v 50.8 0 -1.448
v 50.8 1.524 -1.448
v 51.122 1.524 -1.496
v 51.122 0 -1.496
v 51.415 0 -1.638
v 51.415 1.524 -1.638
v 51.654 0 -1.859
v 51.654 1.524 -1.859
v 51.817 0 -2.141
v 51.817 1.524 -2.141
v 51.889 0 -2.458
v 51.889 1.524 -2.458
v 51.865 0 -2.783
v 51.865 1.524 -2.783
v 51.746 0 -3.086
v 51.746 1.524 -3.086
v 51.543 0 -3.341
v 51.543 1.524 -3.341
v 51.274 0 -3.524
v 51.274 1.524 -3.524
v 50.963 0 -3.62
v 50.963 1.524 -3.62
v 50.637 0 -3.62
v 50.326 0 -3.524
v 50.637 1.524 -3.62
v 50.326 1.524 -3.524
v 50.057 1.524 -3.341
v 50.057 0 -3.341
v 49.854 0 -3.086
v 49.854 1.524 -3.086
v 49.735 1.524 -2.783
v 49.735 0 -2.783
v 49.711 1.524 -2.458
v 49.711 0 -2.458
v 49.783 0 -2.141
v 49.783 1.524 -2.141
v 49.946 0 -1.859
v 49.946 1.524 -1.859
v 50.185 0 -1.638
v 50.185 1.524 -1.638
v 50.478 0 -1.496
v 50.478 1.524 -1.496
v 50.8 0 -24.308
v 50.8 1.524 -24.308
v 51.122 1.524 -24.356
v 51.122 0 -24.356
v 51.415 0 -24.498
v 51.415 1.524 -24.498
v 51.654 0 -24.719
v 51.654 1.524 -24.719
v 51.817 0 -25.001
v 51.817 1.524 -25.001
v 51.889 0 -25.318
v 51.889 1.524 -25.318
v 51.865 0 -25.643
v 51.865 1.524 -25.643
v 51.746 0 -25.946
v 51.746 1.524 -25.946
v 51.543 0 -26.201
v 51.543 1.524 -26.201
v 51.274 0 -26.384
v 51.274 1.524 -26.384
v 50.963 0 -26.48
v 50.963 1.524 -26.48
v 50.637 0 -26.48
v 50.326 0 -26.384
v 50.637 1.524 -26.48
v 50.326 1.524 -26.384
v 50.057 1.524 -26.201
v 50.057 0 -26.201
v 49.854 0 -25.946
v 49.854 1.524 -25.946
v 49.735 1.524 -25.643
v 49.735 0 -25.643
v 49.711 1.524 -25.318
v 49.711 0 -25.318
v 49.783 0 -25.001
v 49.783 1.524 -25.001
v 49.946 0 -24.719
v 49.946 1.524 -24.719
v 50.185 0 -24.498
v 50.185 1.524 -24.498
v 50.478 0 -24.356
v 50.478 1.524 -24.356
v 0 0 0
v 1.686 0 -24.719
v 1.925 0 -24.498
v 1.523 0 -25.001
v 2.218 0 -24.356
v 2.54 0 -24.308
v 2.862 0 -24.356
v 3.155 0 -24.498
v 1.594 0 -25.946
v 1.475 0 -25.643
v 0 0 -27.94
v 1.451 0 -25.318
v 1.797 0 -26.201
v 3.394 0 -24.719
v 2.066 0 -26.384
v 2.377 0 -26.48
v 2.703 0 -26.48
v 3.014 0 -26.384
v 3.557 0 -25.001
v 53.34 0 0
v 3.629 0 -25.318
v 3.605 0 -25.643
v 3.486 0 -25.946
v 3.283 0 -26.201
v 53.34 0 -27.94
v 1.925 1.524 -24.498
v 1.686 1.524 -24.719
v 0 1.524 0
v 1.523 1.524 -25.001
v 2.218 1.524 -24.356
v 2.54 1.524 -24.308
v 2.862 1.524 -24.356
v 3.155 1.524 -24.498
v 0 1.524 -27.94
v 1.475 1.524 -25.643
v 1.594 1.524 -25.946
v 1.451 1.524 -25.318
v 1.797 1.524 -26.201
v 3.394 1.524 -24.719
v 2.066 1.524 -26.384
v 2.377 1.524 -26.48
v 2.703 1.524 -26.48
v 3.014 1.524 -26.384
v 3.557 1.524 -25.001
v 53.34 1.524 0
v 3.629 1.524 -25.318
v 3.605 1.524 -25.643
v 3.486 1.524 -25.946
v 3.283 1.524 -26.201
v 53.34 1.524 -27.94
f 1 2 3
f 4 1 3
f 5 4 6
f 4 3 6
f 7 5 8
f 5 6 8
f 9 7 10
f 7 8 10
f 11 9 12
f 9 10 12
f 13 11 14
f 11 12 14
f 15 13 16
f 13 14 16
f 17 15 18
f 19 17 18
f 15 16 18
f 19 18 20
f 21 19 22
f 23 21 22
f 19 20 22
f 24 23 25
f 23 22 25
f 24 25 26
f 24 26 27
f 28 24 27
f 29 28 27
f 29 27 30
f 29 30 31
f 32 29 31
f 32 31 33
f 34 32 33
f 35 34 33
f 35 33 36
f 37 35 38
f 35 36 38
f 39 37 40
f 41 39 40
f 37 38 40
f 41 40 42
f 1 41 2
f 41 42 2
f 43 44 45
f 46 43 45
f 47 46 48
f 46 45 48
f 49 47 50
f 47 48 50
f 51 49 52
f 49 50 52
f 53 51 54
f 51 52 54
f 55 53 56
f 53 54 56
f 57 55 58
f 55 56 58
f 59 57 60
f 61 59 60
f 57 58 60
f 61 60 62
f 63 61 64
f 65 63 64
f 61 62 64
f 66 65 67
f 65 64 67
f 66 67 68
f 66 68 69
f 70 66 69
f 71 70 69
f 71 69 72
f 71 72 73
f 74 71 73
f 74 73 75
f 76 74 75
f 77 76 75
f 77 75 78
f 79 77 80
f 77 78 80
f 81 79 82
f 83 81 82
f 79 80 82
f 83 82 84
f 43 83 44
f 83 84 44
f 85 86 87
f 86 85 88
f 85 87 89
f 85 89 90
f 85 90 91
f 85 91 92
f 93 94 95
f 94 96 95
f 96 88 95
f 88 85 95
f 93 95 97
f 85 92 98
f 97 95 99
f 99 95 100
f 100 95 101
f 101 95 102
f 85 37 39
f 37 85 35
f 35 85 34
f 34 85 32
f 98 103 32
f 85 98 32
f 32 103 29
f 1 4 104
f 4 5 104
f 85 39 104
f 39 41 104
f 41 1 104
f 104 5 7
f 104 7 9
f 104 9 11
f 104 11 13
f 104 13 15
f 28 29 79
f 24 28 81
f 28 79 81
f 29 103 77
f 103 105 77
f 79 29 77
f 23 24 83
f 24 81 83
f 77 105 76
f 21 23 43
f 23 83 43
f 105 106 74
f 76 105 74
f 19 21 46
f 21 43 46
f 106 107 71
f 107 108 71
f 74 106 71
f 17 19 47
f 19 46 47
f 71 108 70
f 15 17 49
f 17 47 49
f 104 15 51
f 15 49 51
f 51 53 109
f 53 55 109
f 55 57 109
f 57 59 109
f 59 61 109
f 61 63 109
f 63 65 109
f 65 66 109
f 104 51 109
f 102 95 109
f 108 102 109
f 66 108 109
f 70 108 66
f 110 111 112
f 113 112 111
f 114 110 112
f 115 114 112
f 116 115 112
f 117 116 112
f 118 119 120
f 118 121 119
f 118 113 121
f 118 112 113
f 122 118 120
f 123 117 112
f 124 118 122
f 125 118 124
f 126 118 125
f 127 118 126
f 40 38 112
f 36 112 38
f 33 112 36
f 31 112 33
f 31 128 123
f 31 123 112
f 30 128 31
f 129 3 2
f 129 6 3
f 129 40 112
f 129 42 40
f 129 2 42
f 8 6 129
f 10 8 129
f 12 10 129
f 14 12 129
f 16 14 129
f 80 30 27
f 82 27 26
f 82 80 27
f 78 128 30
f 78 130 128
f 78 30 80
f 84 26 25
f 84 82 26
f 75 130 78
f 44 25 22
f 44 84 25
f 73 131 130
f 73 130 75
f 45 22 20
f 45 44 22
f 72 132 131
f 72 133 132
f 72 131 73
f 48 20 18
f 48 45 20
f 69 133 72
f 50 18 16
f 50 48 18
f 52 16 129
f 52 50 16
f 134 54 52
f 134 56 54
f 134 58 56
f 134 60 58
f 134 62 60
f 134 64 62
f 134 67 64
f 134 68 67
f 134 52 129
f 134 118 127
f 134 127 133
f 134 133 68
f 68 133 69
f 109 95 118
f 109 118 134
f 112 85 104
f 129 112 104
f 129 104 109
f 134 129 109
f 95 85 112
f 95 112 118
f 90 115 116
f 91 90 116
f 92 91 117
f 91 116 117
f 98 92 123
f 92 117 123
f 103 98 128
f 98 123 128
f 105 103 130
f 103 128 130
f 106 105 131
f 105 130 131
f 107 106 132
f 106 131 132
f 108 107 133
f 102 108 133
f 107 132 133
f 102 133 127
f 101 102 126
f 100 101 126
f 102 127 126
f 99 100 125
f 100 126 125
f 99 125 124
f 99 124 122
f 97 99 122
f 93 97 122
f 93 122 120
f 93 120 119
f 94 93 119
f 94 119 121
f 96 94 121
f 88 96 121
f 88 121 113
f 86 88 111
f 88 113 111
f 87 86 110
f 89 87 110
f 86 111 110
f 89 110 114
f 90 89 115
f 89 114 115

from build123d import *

# Parameters (mm, degrees)
SKETCH1_W           = 53.34
SKETCH1_H           = 27.94
BOSS_EXTRUDE1_DEPTH = 1.524
SKETCH2_R           = 1.0922
CUT_EXTRUDE1_DEPTH  = 1.524


with BuildPart() as part:
    # Sketch1 → Boss-Extrude1 (new body)
    with BuildSketch(Plane(origin=(0, 0, 0), x_dir=(1, 0, 0), z_dir=(0, 1, 0))):
        with Locations((26.67, 13.97)):
            Rectangle(SKETCH1_W, SKETCH1_H)
    extrude(amount=BOSS_EXTRUDE1_DEPTH)

    # Sketch2 → Cut-Extrude1 (cut)
    with BuildSketch(Plane(origin=(0, 1.524, 0), x_dir=(1, 0, 0), z_dir=(0, 1, 0))):
        with Locations(Location((2.54, 25.4, 0), (0, 0, 270))):
            Circle(SKETCH2_R)
        with Locations(Location((50.8, 25.4, 0), (0, 0, 270))):
            Circle(SKETCH2_R)
        with Locations(Location((50.8, 2.54, 0), (0, 0, 270))):
            Circle(SKETCH2_R)
    extrude(amount=-CUT_EXTRUDE1_DEPTH, mode=Mode.SUBTRACT)


solid = part.part
